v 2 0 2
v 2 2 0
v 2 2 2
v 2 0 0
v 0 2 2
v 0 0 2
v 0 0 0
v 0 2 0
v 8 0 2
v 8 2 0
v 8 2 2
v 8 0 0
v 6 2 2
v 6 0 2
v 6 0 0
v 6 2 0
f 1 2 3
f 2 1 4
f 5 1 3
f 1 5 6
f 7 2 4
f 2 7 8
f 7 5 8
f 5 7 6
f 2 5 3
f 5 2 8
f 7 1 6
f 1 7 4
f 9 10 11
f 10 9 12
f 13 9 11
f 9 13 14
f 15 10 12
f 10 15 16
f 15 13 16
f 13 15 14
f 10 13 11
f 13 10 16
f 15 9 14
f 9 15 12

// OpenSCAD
union() {
  translate([0, 0, 0]) cube(size=[2,2,2], center=false);
  translate([6, 0, 0]) cube(size=[2,2,2], center=false);
}
